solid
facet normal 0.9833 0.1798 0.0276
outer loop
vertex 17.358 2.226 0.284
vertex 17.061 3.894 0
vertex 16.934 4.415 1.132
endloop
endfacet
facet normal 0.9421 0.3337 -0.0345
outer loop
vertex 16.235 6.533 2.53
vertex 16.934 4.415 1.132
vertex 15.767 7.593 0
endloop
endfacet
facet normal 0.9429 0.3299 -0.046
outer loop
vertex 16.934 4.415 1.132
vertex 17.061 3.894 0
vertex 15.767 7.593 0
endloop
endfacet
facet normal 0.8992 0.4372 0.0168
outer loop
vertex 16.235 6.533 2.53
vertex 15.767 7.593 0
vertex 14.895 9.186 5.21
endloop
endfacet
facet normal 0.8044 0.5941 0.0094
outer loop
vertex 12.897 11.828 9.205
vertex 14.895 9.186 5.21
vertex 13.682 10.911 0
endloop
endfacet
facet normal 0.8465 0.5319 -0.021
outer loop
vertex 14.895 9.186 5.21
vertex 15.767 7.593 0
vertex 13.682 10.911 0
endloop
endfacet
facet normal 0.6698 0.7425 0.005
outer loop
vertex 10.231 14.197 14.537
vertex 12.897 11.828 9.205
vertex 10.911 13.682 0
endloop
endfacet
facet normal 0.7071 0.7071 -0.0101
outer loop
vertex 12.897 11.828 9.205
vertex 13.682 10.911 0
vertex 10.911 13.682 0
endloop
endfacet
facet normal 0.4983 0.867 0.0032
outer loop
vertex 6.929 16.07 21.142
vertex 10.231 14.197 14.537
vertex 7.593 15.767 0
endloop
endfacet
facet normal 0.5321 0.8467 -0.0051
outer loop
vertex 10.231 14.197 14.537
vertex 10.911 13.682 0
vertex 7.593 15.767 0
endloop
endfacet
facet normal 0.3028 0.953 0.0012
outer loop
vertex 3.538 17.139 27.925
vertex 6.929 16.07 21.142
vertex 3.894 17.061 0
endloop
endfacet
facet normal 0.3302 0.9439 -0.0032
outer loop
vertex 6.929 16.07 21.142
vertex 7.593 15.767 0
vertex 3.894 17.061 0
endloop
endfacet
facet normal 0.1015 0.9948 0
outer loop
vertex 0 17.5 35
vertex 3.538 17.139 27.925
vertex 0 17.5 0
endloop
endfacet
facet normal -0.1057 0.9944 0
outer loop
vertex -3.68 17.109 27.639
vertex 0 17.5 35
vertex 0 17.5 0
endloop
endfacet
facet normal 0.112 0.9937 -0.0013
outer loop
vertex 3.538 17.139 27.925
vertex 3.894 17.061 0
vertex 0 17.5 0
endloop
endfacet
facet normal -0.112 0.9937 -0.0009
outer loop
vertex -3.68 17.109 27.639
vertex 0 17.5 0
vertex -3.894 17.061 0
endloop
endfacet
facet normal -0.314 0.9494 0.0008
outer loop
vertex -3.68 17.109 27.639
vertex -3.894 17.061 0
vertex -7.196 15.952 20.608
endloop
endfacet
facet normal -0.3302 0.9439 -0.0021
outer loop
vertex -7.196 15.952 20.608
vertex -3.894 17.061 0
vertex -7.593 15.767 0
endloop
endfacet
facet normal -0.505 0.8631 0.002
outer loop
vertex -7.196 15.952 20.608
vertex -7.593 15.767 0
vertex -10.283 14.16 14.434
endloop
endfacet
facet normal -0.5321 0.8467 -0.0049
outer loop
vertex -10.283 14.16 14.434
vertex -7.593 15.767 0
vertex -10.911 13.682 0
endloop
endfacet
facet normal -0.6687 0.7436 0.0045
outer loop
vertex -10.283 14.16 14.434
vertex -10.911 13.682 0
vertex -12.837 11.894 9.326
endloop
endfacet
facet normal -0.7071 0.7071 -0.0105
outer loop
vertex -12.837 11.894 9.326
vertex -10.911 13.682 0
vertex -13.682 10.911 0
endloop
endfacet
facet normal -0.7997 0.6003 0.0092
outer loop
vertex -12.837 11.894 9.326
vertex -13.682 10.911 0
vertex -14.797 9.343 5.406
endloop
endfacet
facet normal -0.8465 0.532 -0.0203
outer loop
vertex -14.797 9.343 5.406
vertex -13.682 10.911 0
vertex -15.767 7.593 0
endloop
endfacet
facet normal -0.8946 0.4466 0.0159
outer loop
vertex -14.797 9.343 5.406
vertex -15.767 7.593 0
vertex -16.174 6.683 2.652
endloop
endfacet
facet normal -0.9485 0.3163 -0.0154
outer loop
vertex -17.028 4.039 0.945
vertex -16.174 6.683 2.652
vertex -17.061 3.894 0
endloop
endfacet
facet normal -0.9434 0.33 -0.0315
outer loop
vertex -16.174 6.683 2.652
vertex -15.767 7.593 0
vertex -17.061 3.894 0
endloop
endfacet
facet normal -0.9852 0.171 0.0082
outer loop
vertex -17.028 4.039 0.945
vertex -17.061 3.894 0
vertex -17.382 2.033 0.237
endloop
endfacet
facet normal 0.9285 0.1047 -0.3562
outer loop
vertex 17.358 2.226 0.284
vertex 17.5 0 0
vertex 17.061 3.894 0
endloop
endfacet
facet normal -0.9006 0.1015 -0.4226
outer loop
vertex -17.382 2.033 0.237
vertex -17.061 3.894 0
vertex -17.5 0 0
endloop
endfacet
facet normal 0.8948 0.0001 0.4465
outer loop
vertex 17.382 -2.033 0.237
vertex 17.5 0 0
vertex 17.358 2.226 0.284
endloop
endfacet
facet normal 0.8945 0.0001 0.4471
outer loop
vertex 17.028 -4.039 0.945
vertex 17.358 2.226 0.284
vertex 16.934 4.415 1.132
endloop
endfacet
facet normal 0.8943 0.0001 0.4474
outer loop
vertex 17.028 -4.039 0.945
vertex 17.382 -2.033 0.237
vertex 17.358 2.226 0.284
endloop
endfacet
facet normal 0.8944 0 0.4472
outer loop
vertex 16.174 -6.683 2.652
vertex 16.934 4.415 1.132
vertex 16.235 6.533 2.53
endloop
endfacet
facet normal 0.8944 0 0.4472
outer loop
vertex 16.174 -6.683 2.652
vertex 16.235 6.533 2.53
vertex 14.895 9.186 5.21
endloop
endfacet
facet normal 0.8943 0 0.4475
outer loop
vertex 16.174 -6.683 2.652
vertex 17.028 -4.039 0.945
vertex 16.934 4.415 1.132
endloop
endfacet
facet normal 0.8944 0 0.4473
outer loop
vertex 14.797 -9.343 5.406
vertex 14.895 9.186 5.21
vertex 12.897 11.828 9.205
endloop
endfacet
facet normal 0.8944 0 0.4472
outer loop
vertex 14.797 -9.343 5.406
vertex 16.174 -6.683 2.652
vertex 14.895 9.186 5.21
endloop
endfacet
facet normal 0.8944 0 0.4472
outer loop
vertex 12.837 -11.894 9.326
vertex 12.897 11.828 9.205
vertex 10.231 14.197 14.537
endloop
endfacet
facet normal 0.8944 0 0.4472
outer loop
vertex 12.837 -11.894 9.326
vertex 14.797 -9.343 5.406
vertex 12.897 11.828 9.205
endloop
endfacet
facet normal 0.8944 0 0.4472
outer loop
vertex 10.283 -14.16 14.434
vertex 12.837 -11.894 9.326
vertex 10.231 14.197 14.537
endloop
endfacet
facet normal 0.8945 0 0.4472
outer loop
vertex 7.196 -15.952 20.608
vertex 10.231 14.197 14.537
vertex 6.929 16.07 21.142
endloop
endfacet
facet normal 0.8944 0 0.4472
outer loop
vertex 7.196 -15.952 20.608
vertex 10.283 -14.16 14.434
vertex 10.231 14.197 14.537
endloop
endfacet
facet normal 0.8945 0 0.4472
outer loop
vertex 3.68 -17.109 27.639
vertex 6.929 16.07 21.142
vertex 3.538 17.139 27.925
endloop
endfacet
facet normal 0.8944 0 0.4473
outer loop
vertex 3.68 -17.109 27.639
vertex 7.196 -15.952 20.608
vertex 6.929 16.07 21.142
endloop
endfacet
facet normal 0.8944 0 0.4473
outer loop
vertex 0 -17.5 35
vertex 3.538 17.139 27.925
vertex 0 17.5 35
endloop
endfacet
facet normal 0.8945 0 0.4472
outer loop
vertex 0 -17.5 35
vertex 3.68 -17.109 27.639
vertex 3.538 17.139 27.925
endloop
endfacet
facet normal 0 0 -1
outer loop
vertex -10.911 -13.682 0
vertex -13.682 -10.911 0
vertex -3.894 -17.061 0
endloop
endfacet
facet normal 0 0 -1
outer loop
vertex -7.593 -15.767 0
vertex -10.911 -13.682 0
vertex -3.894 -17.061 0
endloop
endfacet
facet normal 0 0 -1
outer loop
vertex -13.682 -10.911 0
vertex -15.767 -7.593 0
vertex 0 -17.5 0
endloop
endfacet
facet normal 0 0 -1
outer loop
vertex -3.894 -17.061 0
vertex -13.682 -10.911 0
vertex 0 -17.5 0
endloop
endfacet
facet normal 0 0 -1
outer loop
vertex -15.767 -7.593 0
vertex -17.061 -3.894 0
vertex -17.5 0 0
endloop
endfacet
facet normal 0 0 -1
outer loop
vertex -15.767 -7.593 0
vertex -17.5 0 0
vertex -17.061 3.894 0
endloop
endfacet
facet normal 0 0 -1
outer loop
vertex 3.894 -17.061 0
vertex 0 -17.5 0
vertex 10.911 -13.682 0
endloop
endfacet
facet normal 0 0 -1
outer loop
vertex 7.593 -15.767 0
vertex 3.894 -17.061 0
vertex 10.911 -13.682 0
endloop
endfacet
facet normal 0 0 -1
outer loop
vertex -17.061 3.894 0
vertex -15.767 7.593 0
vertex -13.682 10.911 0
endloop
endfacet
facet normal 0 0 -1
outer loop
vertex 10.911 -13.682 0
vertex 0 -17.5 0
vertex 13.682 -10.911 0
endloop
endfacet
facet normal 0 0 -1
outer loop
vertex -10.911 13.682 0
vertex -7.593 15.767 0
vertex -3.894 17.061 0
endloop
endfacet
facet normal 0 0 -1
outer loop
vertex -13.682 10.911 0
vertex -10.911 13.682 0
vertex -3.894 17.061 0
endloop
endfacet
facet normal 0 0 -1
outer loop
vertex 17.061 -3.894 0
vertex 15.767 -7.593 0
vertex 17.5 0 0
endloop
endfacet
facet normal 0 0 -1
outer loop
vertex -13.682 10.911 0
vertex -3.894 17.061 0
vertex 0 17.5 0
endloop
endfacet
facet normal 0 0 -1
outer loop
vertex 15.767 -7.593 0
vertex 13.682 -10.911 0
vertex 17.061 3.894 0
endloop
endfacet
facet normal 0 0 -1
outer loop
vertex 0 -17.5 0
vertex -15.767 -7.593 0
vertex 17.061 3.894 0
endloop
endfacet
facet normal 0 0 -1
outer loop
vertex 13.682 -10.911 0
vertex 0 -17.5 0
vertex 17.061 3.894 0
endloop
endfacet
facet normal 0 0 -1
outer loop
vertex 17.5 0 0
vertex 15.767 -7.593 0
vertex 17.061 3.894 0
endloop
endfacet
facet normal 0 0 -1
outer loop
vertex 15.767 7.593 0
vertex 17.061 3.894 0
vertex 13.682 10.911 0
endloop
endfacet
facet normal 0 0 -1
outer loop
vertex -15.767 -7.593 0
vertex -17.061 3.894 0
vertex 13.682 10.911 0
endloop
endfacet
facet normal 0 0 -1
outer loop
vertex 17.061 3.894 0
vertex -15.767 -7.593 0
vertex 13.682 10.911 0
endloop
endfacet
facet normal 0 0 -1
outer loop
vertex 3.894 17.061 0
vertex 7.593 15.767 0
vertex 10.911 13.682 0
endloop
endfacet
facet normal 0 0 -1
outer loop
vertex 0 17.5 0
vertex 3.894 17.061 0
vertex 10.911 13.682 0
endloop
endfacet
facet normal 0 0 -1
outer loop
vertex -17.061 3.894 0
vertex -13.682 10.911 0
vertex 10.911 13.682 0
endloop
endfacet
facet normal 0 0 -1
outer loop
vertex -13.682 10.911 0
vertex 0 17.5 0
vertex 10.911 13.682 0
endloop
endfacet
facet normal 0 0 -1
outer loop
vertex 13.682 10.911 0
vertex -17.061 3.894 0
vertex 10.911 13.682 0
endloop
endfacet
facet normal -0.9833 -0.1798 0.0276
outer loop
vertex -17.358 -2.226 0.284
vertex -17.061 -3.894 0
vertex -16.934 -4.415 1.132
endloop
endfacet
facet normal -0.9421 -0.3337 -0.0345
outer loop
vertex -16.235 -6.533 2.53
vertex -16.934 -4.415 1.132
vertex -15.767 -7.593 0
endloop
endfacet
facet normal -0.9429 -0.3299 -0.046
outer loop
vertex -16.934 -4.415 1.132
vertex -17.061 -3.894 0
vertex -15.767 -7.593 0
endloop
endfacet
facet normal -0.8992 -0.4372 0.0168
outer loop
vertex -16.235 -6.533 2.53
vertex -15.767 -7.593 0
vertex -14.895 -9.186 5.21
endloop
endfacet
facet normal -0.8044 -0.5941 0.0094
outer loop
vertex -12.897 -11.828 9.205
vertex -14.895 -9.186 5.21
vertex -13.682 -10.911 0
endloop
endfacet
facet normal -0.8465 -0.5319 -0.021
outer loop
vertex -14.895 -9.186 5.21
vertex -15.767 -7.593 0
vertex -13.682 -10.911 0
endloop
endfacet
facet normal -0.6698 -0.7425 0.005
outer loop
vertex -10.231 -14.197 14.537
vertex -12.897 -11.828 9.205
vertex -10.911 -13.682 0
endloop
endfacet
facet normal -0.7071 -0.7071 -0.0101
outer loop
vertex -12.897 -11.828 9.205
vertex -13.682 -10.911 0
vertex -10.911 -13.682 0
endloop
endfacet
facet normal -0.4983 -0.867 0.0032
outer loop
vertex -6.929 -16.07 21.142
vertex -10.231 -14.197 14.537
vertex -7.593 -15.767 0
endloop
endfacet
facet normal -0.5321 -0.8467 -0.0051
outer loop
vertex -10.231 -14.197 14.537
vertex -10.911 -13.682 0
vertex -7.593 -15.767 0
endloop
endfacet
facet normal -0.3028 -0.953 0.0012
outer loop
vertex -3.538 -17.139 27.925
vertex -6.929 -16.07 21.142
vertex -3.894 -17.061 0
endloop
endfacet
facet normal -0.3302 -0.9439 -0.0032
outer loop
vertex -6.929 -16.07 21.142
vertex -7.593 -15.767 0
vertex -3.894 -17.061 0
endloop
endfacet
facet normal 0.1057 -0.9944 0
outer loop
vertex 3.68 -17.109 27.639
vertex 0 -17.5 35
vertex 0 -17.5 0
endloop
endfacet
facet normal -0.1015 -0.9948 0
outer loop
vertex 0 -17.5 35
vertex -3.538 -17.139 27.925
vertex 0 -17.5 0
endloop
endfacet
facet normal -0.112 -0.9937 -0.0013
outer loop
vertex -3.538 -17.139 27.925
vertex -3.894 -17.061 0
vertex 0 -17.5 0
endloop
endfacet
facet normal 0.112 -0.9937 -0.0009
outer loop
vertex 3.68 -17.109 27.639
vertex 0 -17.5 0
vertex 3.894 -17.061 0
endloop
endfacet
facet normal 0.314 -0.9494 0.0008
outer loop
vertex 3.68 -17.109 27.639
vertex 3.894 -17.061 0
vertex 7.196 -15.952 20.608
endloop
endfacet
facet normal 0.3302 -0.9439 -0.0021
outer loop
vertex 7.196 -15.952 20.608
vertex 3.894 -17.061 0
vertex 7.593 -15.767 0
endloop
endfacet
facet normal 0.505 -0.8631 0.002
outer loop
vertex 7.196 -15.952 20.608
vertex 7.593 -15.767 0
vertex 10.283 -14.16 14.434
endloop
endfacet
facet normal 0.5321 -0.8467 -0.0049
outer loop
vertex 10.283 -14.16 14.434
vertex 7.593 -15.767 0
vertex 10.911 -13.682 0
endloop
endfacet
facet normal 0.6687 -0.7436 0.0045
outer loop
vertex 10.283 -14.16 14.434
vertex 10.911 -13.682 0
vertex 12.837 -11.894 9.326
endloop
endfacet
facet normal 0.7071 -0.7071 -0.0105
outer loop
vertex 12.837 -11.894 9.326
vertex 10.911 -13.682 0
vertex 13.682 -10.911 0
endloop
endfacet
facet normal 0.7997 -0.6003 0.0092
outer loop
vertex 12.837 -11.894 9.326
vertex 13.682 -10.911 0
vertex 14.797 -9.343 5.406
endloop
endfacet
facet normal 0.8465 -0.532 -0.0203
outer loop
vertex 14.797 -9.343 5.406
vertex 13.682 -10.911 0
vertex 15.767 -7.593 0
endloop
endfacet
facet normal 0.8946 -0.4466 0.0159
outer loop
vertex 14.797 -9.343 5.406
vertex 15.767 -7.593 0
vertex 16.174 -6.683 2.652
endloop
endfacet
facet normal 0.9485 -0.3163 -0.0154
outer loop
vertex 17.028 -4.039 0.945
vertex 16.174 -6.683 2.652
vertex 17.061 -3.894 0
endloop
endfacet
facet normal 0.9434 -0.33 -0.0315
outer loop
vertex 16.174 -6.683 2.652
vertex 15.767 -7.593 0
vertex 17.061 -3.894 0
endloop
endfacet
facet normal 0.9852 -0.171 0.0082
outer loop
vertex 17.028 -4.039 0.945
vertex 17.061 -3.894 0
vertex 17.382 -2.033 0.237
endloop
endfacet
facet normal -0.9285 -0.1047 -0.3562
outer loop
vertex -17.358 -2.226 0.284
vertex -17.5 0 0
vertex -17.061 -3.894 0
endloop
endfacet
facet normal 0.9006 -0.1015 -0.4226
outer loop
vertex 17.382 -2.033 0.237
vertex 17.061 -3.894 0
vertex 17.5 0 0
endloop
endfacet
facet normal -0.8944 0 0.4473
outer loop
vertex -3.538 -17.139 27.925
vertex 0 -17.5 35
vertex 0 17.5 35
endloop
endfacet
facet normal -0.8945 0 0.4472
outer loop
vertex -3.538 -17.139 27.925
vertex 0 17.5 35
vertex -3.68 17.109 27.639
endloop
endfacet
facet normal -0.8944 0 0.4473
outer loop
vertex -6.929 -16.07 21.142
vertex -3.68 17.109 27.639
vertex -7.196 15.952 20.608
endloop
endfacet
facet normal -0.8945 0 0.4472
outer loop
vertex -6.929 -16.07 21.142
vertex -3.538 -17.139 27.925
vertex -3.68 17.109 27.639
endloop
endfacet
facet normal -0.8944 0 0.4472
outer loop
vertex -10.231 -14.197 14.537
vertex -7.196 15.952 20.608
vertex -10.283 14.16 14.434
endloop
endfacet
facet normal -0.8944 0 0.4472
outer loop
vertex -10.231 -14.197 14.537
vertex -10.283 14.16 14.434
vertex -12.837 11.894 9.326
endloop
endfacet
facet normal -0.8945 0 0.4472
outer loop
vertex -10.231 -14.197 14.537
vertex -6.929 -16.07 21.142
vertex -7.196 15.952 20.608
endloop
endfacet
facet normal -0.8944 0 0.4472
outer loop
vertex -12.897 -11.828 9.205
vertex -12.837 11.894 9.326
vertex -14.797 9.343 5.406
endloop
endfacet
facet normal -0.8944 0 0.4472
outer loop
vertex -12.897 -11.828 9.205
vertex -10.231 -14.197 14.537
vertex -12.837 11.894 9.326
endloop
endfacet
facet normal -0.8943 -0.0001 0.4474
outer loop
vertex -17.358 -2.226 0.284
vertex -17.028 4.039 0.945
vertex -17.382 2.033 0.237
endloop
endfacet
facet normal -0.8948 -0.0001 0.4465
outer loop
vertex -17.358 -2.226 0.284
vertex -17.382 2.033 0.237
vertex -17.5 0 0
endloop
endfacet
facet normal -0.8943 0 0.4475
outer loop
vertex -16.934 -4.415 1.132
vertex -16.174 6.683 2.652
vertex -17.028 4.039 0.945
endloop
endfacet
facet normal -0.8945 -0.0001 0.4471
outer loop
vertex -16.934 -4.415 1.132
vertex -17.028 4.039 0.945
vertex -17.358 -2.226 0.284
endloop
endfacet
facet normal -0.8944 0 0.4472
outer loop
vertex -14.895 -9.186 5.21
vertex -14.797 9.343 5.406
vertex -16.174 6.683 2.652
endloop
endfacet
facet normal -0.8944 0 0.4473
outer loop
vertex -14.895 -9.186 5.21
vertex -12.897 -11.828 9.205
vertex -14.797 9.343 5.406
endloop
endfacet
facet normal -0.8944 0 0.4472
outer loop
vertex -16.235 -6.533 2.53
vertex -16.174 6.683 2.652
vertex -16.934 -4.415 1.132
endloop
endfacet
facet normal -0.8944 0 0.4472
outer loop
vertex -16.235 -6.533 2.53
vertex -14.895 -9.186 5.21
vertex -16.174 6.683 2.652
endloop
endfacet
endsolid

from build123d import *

# Parameters (mm, degrees)
F0_R     = 17.5
F1_DEPTH = 35
F3_DEPTH = 25


with BuildPart() as f1:
    # F0 (on Top) → F1 (new body)
    with BuildSketch(Plane.XY):
        Circle(F0_R)
    extrude(amount=F1_DEPTH)


with BuildPart() as f3:
    # F2 (on Front) → F3 (new body, symmetric)
    with BuildSketch(Plane.XZ):
        Polygon((0, 35), (-17.5, 0), (17.5, 0), align=None)
    extrude(amount=F3_DEPTH, both=True)


with BuildPart() as f1_1:
    add(f1.part)

    # F4: intersect F3
    add(f3.part, mode=Mode.INTERSECT)


solid = f1_1.part
